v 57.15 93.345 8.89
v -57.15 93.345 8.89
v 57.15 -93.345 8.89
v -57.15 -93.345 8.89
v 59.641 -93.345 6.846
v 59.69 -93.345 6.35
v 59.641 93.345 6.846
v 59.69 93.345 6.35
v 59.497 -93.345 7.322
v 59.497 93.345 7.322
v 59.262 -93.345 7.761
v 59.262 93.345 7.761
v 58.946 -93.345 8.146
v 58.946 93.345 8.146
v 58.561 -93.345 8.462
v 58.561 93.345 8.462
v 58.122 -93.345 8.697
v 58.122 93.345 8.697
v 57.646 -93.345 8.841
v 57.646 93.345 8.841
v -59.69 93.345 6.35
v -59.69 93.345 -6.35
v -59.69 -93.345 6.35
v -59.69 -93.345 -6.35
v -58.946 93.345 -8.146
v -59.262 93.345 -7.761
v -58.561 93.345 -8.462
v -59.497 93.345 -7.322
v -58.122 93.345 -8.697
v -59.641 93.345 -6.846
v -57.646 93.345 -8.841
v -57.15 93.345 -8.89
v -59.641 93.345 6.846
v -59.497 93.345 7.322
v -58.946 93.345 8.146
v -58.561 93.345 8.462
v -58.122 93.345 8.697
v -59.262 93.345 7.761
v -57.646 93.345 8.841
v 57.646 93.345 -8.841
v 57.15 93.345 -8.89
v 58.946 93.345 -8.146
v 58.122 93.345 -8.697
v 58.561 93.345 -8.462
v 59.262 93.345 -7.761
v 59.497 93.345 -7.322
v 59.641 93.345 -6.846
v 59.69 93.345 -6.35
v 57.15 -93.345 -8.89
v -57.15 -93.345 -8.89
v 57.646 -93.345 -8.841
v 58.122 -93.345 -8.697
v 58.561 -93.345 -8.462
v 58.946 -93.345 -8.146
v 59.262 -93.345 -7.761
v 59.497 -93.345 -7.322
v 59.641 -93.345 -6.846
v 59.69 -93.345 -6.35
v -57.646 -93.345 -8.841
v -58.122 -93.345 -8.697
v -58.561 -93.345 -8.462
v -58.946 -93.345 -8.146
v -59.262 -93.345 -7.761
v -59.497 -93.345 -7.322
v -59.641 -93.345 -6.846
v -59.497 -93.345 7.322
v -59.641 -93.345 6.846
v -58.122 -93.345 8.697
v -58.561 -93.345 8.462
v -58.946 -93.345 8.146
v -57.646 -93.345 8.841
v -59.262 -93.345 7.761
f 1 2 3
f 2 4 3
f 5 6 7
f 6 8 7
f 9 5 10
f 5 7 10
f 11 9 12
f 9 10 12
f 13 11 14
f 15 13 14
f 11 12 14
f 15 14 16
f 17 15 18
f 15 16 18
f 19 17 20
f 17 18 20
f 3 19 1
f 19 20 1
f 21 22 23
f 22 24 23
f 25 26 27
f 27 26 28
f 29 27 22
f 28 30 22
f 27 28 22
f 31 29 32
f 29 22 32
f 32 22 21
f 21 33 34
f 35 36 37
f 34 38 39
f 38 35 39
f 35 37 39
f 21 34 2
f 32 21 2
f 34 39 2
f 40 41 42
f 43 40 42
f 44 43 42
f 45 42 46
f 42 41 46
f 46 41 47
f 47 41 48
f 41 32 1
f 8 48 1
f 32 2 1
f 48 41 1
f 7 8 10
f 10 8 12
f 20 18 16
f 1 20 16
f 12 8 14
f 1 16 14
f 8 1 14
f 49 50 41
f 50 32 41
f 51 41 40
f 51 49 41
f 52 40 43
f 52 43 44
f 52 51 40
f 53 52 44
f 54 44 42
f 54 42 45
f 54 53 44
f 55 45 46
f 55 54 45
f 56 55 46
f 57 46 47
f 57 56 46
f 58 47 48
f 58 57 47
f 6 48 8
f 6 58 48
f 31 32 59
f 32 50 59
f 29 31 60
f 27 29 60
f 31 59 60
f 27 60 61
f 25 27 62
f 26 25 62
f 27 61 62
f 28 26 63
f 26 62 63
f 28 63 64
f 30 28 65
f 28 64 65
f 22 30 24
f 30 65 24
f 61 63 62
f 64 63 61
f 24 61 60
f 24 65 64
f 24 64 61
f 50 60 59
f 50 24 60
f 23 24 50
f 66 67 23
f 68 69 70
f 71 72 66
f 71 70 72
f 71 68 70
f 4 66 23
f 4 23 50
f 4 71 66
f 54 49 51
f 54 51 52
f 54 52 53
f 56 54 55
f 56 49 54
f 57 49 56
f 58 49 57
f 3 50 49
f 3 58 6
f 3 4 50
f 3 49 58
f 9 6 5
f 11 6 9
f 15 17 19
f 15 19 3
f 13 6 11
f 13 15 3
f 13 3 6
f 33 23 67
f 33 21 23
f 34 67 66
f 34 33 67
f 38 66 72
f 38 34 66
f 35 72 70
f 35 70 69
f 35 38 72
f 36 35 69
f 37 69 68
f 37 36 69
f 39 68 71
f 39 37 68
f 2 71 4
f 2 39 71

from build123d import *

# Parameters (mm, degrees)
F0_W     = 119.38
F0_H     = 17.78
F1_DEPTH = 93.345
F2_W     = 106.68
F2_H     = 177.8
F3_DEPTH = 17.78
F4_W     = 106.68
F4_H     = 177.8
F5_DEPTH = 8.89
F6_R     = 2.54


with BuildPart() as f1:
    # F0 (on Front) → F1 (new body, symmetric)
    with BuildSketch(Plane.XZ):
        Rectangle(F0_W, F0_H)
    extrude(amount=F1_DEPTH, both=True)

    # F2 (on face) → F3 (cut)
    with BuildSketch(Plane.XY):
        Rectangle(F2_W, F2_H)
    extrude(amount=-F3_DEPTH, mode=Mode.SUBTRACT)

    # F4 (on Top) → F5 (join, symmetric)
    with BuildSketch(Plane.XY):
        Rectangle(F4_W, F4_H)
    extrude(amount=F5_DEPTH, both=True)

    # F6
    f6_edges = [f1.edges().sort_by_distance(p)[0] for p in [
        (-59.69, 0, 8.89),
        (-59.69, 0, -8.89),
        (59.69, 0, 8.89),
        (59.69, 0, -8.89),
    ]]
    fillet(f6_edges, radius=F6_R)


solid = f1.part
